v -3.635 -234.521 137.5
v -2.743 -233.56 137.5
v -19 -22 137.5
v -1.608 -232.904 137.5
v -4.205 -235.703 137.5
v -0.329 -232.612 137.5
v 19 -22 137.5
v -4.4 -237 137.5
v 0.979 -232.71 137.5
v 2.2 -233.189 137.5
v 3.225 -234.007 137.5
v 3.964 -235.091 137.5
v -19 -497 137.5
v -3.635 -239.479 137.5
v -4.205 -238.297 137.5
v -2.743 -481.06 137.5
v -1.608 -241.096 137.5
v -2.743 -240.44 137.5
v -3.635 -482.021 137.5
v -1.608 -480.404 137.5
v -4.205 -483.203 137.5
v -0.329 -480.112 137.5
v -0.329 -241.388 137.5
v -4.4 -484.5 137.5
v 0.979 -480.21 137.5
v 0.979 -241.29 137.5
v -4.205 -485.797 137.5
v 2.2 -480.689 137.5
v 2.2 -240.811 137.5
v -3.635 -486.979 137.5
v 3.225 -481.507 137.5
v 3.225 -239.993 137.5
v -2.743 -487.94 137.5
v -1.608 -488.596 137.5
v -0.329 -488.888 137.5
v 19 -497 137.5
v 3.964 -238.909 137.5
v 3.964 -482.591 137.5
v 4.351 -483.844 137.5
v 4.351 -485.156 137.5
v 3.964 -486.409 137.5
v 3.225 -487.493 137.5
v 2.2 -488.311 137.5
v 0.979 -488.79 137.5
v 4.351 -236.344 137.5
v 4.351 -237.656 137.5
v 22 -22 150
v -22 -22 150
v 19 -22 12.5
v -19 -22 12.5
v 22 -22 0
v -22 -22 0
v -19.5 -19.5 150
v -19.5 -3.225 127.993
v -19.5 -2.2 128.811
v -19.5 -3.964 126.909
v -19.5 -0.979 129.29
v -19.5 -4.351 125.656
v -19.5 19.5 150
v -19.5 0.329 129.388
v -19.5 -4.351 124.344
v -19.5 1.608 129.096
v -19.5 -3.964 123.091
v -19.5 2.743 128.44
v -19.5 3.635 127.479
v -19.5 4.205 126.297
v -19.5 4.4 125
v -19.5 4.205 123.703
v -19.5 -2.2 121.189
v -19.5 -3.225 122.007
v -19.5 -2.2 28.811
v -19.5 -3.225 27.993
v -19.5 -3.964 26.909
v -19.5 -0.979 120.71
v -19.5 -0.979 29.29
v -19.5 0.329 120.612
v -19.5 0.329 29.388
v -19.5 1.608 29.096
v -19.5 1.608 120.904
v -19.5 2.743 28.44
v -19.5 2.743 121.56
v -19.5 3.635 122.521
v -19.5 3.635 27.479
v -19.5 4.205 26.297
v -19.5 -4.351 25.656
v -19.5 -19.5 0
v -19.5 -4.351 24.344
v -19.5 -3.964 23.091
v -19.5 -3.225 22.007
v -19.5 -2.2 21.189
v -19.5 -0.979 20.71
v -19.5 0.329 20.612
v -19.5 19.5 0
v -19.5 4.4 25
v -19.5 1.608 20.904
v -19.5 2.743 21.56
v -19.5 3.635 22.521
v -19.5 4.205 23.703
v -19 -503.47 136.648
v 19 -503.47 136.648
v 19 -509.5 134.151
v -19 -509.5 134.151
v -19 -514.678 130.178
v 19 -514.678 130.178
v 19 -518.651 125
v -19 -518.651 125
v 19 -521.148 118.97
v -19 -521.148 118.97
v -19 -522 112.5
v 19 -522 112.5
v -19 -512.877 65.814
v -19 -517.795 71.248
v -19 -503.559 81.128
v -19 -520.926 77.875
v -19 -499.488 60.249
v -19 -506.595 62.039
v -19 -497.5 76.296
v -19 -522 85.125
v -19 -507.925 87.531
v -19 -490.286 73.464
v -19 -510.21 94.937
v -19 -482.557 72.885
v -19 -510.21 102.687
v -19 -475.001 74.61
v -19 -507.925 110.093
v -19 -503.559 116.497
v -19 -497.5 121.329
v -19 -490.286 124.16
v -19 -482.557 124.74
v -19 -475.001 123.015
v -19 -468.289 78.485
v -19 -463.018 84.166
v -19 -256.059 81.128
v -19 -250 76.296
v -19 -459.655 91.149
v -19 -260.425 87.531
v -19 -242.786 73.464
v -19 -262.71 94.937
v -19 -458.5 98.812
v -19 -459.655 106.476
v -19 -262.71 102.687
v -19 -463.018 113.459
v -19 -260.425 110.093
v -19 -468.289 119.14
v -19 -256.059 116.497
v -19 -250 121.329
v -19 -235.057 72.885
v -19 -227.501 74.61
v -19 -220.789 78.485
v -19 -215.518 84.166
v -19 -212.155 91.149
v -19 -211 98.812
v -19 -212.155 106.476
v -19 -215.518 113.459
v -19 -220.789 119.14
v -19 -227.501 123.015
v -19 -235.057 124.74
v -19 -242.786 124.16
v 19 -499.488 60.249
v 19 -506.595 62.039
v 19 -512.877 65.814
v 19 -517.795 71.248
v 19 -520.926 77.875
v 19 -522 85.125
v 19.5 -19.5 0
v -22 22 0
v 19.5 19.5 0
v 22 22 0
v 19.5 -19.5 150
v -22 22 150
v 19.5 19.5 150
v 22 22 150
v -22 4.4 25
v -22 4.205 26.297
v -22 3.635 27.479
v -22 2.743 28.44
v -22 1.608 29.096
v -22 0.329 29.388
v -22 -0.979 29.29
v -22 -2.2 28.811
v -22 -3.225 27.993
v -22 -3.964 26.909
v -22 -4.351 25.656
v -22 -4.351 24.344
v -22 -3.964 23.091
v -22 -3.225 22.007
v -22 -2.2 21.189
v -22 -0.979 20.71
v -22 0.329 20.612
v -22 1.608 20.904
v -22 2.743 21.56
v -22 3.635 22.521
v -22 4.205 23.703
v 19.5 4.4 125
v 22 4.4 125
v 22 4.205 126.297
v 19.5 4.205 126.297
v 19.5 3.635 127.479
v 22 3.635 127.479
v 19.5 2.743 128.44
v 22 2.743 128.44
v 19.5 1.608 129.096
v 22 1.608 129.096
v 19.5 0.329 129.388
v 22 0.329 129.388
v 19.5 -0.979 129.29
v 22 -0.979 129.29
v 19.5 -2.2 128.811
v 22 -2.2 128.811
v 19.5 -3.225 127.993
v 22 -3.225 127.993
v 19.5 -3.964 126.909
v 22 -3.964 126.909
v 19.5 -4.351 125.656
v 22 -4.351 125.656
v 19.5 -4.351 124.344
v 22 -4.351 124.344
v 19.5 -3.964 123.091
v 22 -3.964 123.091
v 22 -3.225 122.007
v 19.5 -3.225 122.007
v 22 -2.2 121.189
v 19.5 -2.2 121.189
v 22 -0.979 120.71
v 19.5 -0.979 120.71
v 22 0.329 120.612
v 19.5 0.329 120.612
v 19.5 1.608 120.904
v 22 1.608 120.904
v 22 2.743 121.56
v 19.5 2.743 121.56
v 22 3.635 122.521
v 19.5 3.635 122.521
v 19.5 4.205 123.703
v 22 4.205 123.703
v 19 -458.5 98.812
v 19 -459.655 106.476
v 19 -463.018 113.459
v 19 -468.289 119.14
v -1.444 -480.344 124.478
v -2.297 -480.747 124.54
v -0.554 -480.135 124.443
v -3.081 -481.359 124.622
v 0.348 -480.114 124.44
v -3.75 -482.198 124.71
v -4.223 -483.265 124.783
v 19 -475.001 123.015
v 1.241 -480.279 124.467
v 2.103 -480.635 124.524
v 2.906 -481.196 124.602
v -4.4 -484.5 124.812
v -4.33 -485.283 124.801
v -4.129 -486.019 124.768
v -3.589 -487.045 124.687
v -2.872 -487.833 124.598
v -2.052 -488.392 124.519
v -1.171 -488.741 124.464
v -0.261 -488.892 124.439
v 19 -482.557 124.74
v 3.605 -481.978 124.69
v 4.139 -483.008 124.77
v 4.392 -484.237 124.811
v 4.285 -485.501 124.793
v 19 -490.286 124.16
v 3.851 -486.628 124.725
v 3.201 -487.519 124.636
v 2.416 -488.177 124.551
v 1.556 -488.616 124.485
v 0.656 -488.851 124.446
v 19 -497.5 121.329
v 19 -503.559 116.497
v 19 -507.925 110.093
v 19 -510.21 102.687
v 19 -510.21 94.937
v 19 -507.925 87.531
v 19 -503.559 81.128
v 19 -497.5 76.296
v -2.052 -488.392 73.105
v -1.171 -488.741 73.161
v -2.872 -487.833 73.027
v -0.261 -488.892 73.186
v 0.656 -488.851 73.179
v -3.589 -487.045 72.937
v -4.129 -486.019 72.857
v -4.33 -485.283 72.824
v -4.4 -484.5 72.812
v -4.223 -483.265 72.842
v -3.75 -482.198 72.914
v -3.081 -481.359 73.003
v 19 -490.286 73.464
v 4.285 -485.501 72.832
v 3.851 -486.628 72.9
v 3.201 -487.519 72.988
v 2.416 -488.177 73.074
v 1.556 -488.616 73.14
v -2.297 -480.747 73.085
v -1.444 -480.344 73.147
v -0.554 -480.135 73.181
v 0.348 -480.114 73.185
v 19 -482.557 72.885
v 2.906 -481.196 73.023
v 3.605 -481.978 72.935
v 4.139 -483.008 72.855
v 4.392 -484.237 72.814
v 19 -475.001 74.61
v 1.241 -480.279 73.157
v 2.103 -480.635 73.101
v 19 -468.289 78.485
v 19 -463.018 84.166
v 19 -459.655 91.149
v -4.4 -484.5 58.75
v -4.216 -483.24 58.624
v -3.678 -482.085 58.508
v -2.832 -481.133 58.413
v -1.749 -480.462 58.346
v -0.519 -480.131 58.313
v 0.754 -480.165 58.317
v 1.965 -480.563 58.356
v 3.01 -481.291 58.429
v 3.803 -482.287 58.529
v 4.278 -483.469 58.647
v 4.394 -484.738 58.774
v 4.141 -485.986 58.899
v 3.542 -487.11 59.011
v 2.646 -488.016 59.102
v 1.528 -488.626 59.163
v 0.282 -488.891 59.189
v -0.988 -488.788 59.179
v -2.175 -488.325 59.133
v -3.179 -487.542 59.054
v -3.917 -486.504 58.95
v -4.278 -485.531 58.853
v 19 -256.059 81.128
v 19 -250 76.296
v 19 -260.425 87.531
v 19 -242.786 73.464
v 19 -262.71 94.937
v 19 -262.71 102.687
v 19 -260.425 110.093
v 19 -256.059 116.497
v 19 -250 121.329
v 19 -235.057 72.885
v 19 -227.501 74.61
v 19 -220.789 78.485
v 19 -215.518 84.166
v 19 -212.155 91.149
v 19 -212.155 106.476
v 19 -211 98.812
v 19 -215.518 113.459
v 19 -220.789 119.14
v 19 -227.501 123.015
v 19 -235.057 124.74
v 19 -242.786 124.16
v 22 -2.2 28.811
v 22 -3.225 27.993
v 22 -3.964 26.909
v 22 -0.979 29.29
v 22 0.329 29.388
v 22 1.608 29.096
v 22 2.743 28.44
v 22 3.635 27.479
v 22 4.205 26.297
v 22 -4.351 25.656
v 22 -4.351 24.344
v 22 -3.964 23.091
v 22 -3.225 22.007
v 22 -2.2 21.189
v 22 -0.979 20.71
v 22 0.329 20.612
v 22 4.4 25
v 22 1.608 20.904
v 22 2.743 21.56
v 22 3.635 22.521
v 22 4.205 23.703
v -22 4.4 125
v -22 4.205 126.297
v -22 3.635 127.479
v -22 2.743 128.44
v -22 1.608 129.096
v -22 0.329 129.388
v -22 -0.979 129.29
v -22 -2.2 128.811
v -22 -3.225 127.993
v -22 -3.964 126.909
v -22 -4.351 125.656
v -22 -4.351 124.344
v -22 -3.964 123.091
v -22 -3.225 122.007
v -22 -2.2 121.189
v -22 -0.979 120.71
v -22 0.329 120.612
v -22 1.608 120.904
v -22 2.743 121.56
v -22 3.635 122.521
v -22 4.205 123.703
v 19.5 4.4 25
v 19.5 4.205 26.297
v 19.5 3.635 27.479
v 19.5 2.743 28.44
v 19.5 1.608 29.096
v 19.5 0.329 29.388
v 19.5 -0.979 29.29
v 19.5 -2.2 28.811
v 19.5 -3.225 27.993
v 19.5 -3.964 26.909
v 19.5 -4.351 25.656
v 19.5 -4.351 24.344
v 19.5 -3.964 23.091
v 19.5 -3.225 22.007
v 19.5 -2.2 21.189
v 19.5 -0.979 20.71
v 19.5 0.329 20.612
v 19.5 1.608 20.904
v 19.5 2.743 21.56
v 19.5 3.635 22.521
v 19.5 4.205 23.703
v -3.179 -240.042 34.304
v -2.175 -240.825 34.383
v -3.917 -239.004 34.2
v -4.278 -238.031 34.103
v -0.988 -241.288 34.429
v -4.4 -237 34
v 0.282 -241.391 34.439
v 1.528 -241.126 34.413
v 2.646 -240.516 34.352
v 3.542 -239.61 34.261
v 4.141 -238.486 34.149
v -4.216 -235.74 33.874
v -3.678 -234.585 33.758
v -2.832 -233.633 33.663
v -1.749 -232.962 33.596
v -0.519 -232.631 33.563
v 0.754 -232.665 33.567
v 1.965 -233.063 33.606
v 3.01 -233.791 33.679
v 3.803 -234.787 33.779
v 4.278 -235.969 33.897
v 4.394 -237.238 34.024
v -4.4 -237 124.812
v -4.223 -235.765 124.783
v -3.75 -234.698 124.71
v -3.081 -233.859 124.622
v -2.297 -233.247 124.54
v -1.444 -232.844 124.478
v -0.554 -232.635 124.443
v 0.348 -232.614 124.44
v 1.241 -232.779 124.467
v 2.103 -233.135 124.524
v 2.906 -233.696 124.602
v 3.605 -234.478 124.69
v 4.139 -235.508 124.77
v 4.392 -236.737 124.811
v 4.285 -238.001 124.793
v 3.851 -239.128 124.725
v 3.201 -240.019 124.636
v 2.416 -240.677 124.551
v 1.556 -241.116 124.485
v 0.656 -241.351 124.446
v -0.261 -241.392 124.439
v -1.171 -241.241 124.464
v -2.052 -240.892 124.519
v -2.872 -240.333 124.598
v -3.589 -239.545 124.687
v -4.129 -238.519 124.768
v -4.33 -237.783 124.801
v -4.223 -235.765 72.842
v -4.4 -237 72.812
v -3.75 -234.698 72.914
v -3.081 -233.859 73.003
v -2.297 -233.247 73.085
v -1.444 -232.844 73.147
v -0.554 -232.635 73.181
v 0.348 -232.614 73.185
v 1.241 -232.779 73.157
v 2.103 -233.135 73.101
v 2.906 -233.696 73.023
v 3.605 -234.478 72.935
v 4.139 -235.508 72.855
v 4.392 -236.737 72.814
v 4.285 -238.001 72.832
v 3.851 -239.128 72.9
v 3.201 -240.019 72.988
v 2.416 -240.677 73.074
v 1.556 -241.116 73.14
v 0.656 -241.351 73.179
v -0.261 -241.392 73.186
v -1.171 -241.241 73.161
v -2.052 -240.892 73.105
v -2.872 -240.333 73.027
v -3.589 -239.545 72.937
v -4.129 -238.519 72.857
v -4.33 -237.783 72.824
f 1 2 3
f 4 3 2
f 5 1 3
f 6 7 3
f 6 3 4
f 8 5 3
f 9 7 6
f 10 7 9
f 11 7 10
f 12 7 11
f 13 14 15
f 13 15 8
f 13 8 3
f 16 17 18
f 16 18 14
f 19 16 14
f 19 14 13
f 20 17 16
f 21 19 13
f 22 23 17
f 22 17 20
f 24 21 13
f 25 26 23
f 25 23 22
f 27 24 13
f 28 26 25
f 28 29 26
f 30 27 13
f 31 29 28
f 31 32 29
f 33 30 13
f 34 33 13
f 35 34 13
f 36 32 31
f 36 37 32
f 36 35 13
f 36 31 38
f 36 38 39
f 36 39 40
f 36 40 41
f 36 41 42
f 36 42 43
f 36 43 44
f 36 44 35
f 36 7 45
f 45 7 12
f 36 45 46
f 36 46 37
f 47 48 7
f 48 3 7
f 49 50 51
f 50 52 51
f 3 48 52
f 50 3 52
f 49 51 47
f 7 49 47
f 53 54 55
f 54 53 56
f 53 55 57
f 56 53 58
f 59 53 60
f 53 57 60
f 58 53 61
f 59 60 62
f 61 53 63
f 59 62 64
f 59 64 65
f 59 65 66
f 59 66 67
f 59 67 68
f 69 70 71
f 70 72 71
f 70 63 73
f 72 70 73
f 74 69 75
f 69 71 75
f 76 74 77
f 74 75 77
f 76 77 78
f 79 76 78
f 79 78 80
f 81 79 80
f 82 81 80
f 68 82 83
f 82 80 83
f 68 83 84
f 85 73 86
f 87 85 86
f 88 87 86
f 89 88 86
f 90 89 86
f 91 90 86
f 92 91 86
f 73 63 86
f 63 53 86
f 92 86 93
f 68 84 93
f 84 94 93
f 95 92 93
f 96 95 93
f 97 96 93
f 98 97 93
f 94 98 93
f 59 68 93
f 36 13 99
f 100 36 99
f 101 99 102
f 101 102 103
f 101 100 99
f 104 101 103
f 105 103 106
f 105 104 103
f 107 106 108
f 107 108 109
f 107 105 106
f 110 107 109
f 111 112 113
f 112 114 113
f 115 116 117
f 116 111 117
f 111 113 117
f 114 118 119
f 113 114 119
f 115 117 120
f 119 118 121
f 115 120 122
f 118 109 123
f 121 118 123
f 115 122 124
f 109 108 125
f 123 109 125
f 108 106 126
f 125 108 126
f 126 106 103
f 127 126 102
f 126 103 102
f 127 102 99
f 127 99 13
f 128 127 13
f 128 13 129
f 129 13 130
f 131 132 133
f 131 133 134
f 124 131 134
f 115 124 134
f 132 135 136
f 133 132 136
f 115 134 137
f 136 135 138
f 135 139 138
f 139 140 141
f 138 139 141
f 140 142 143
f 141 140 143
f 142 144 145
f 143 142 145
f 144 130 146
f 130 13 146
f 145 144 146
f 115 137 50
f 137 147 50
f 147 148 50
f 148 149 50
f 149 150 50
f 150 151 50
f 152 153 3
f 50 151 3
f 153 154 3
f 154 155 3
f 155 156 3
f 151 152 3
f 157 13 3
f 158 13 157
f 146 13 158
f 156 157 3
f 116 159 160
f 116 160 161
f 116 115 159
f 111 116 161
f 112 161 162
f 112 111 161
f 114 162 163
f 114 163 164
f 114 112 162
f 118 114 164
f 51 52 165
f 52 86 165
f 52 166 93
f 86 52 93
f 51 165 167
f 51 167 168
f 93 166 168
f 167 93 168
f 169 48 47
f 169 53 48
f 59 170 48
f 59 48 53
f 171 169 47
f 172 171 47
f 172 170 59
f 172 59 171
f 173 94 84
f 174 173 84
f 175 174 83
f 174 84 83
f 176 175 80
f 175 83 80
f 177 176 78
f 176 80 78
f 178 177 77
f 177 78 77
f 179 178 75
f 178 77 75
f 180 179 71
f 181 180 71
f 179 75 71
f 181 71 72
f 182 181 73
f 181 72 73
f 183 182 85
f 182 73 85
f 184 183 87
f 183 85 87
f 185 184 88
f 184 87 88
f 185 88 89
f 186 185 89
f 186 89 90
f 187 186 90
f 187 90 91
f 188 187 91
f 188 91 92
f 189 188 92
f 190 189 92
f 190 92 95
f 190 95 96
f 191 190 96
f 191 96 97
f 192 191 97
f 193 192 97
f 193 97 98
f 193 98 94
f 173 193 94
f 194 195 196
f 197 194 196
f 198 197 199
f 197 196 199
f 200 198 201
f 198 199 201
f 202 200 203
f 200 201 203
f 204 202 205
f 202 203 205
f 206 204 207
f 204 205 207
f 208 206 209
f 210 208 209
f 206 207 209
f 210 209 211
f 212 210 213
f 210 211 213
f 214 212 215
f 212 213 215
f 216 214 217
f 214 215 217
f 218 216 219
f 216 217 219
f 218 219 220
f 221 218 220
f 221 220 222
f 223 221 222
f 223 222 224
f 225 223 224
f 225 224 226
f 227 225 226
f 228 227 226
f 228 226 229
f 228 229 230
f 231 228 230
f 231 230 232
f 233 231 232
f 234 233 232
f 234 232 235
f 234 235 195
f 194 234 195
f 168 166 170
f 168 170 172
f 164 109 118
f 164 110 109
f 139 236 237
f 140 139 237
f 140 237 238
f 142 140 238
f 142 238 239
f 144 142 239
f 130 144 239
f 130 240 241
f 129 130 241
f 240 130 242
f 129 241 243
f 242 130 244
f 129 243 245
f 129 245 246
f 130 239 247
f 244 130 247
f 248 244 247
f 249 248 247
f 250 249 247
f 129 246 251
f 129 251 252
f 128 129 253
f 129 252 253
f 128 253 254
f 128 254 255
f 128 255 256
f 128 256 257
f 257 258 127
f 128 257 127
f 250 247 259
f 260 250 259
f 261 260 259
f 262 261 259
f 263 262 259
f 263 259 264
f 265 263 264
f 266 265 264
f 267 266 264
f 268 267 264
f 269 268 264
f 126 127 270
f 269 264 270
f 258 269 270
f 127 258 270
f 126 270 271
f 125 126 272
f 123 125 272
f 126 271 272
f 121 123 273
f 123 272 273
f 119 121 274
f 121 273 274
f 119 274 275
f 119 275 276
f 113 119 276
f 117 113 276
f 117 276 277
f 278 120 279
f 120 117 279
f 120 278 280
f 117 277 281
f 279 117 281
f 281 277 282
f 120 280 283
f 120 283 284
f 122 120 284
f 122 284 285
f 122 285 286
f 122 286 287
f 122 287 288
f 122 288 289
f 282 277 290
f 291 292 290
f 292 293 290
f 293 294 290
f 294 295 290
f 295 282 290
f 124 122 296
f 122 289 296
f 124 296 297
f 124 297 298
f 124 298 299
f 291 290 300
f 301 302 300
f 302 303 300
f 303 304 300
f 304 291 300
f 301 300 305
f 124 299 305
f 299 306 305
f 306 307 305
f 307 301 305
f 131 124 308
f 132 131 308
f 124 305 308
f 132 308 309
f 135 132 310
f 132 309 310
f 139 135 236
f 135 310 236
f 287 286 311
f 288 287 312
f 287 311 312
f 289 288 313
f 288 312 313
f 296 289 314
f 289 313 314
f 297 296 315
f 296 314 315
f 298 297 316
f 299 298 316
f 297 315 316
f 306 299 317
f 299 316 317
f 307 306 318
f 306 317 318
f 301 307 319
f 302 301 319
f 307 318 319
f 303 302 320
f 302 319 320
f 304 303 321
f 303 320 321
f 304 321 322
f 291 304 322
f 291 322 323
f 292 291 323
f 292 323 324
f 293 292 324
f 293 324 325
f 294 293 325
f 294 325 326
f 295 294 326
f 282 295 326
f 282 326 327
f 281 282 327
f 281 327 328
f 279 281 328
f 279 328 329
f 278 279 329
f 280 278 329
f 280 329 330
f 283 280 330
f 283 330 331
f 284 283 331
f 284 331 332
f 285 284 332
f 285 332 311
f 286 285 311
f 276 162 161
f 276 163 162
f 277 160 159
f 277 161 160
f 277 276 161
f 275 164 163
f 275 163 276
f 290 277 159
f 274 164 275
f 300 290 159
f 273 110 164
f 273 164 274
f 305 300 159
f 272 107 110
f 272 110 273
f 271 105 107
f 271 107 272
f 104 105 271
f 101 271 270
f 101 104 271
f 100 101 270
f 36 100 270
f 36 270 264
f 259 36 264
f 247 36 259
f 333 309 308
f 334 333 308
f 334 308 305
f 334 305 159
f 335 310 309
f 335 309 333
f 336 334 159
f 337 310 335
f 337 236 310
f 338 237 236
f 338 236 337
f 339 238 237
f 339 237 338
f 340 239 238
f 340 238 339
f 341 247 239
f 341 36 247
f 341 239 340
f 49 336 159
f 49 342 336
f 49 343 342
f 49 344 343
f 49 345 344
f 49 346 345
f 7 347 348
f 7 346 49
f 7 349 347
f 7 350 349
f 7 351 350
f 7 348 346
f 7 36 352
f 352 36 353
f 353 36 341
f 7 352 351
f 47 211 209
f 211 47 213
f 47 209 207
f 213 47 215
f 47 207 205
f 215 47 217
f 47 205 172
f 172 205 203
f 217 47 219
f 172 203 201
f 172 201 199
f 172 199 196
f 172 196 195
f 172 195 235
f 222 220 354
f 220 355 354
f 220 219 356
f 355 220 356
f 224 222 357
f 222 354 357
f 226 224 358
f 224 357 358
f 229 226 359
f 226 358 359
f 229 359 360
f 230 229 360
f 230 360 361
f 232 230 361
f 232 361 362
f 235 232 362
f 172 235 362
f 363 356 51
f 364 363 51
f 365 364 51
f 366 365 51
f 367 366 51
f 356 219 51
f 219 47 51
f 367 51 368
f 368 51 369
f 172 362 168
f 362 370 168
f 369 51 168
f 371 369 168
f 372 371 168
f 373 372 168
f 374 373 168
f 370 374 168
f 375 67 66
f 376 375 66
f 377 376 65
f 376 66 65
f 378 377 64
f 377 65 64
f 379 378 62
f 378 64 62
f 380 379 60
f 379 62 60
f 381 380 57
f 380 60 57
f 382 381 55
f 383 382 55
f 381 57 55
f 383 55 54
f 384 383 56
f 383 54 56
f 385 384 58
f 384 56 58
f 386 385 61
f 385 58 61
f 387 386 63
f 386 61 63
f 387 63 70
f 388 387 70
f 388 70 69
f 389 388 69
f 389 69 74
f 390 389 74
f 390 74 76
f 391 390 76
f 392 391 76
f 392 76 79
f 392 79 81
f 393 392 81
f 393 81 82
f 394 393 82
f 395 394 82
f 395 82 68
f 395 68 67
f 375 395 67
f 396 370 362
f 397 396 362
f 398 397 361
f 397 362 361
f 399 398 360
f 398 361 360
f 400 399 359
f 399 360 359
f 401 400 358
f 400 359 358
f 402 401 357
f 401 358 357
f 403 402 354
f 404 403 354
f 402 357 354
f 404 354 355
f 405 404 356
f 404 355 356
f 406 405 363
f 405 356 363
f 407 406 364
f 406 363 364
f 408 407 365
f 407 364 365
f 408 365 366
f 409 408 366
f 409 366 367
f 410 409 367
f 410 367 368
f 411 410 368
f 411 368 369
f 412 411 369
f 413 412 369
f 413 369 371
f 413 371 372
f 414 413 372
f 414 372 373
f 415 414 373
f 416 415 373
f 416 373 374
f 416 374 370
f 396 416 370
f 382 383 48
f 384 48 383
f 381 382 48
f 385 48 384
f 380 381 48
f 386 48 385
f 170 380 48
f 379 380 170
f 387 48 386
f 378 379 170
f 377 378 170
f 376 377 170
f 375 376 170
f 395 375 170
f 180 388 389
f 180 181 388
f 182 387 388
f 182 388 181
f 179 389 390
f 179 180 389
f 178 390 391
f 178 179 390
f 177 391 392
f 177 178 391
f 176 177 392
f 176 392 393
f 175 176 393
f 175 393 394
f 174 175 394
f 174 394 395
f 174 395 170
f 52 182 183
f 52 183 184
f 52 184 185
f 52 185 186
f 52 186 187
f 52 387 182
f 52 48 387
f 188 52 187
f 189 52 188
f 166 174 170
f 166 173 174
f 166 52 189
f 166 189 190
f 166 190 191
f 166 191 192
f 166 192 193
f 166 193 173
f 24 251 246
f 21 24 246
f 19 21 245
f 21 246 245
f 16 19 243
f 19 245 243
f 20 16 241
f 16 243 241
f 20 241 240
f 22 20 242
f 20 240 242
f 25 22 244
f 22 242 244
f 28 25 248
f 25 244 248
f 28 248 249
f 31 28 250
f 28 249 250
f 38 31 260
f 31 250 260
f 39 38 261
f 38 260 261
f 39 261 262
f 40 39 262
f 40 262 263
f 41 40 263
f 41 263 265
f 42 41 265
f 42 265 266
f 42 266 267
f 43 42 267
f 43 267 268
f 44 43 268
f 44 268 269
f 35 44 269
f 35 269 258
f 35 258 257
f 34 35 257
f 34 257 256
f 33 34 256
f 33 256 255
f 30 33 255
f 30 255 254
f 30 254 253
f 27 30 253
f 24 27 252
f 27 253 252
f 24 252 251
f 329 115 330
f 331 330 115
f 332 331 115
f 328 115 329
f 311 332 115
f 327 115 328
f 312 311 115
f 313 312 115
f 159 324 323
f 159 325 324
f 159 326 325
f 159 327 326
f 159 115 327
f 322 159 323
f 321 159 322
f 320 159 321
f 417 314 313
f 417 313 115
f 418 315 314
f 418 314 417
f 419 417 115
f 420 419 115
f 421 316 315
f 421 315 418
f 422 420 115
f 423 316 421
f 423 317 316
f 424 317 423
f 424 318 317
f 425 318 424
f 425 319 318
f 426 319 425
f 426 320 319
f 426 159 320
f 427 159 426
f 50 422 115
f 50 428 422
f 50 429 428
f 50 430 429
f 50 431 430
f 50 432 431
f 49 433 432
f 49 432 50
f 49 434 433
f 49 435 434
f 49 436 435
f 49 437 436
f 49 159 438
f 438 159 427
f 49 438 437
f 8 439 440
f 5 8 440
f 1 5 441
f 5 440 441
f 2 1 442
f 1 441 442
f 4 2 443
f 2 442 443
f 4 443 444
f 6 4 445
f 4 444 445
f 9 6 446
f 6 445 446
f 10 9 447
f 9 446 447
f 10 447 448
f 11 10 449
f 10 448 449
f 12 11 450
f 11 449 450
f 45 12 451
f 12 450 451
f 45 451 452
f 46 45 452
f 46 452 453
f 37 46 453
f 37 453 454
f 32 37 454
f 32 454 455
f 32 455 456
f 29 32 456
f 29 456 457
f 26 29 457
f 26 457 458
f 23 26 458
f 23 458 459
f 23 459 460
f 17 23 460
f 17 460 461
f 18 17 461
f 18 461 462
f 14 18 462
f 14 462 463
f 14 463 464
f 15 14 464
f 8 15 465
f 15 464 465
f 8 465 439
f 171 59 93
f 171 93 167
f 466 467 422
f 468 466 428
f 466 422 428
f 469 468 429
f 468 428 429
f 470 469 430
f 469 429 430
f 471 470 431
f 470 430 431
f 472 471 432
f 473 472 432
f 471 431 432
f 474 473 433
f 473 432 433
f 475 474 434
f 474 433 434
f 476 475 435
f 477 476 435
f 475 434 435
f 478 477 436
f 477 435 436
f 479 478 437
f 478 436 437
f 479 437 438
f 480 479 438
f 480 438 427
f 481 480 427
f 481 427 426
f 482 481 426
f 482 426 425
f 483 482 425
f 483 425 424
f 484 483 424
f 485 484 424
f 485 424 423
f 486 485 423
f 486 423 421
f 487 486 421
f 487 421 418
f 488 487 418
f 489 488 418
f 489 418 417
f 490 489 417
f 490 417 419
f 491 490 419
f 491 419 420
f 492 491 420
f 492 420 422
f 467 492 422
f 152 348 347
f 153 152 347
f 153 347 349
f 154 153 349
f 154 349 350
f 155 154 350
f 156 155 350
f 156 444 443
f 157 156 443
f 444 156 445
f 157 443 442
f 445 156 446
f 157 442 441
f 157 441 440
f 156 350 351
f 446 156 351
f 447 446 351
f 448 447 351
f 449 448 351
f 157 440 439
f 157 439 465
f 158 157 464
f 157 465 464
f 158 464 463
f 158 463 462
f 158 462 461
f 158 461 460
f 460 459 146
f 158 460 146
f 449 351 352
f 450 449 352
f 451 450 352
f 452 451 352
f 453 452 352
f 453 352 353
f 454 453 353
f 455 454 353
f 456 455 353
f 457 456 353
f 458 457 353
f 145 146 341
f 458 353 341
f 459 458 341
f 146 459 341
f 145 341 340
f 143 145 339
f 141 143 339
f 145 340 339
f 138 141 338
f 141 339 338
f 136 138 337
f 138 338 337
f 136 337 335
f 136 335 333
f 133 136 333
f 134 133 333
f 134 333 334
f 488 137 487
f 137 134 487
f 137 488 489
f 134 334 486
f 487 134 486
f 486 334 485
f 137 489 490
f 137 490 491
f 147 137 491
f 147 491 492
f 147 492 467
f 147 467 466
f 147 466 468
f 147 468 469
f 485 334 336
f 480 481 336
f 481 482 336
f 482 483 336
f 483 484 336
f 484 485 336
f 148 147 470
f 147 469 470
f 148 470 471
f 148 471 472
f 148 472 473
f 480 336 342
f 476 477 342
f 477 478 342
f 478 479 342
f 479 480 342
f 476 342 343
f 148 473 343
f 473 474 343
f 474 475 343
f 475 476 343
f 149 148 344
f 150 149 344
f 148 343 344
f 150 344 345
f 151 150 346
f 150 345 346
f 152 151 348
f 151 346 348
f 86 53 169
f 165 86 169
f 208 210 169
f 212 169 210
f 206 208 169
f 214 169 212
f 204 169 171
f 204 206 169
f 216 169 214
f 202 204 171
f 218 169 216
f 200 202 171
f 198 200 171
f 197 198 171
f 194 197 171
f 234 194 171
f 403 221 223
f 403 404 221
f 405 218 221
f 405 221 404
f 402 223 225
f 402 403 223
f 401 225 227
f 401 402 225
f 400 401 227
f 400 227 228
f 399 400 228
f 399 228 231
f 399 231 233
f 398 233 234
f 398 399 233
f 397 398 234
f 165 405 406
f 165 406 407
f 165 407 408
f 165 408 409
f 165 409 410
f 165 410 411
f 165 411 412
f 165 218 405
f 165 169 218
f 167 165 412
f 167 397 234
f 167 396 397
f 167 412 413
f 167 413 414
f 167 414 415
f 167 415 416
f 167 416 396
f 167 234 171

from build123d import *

# Parameters (mm, degrees)
F0_W     = 44
F0_H     = 44
F0_W_2   = 39
F0_H_2   = 39
F1_DEPTH = 150
F3_D     = 8.8
F5_DEPTH = 19
F6_R     = 25
F8_D     = 52
F10_D    = 8.8


with BuildPart() as f1:
    # F0 (on Top) → F1 (new body)
    with BuildSketch(Plane.XY):
        Rectangle(F0_W, F0_H)
        Rectangle(F0_W_2, F0_H_2, mode=Mode.SUBTRACT)
    extrude(amount=F1_DEPTH)

    # F3 (through all)
    with Locations(Plane(origin=(-22, 0, 0), x_dir=(0, -1, 0), z_dir=(-1, 0, 0))):
        with Locations((0, 125), (0, 25)):
            Hole(F3_D / 2)

    # F4 (on Right) → F5 (join, symmetric)
    with BuildSketch(Plane.YZ):
        Polygon((-22, 12.5), (-22, 137.5), (-522, 137.5), (-522, 62.5), align=None)
    extrude(amount=F5_DEPTH, both=True)

    # F6
    f6_edges = [f1.edges().sort_by_distance(p)[0] for p in [
        (0, -522, 137.5),
        (0, -522, 62.5),
    ]]
    fillet(f6_edges, radius=F6_R)

    # F8 (through all)
    with Locations(Plane(origin=(-19, 0, 0), x_dir=(0, -1, 0), z_dir=(-1, 0, 0))):
        with Locations((484.5, 98.8123445264), (237, 98.8123445264)):
            Hole(F8_D / 2)

    # F10 (through all)
    with Locations(Plane.XY.offset(137.5)):
        with Locations((0, -237), (0, -484.5)):
            Hole(F10_D / 2)


solid = f1.part
